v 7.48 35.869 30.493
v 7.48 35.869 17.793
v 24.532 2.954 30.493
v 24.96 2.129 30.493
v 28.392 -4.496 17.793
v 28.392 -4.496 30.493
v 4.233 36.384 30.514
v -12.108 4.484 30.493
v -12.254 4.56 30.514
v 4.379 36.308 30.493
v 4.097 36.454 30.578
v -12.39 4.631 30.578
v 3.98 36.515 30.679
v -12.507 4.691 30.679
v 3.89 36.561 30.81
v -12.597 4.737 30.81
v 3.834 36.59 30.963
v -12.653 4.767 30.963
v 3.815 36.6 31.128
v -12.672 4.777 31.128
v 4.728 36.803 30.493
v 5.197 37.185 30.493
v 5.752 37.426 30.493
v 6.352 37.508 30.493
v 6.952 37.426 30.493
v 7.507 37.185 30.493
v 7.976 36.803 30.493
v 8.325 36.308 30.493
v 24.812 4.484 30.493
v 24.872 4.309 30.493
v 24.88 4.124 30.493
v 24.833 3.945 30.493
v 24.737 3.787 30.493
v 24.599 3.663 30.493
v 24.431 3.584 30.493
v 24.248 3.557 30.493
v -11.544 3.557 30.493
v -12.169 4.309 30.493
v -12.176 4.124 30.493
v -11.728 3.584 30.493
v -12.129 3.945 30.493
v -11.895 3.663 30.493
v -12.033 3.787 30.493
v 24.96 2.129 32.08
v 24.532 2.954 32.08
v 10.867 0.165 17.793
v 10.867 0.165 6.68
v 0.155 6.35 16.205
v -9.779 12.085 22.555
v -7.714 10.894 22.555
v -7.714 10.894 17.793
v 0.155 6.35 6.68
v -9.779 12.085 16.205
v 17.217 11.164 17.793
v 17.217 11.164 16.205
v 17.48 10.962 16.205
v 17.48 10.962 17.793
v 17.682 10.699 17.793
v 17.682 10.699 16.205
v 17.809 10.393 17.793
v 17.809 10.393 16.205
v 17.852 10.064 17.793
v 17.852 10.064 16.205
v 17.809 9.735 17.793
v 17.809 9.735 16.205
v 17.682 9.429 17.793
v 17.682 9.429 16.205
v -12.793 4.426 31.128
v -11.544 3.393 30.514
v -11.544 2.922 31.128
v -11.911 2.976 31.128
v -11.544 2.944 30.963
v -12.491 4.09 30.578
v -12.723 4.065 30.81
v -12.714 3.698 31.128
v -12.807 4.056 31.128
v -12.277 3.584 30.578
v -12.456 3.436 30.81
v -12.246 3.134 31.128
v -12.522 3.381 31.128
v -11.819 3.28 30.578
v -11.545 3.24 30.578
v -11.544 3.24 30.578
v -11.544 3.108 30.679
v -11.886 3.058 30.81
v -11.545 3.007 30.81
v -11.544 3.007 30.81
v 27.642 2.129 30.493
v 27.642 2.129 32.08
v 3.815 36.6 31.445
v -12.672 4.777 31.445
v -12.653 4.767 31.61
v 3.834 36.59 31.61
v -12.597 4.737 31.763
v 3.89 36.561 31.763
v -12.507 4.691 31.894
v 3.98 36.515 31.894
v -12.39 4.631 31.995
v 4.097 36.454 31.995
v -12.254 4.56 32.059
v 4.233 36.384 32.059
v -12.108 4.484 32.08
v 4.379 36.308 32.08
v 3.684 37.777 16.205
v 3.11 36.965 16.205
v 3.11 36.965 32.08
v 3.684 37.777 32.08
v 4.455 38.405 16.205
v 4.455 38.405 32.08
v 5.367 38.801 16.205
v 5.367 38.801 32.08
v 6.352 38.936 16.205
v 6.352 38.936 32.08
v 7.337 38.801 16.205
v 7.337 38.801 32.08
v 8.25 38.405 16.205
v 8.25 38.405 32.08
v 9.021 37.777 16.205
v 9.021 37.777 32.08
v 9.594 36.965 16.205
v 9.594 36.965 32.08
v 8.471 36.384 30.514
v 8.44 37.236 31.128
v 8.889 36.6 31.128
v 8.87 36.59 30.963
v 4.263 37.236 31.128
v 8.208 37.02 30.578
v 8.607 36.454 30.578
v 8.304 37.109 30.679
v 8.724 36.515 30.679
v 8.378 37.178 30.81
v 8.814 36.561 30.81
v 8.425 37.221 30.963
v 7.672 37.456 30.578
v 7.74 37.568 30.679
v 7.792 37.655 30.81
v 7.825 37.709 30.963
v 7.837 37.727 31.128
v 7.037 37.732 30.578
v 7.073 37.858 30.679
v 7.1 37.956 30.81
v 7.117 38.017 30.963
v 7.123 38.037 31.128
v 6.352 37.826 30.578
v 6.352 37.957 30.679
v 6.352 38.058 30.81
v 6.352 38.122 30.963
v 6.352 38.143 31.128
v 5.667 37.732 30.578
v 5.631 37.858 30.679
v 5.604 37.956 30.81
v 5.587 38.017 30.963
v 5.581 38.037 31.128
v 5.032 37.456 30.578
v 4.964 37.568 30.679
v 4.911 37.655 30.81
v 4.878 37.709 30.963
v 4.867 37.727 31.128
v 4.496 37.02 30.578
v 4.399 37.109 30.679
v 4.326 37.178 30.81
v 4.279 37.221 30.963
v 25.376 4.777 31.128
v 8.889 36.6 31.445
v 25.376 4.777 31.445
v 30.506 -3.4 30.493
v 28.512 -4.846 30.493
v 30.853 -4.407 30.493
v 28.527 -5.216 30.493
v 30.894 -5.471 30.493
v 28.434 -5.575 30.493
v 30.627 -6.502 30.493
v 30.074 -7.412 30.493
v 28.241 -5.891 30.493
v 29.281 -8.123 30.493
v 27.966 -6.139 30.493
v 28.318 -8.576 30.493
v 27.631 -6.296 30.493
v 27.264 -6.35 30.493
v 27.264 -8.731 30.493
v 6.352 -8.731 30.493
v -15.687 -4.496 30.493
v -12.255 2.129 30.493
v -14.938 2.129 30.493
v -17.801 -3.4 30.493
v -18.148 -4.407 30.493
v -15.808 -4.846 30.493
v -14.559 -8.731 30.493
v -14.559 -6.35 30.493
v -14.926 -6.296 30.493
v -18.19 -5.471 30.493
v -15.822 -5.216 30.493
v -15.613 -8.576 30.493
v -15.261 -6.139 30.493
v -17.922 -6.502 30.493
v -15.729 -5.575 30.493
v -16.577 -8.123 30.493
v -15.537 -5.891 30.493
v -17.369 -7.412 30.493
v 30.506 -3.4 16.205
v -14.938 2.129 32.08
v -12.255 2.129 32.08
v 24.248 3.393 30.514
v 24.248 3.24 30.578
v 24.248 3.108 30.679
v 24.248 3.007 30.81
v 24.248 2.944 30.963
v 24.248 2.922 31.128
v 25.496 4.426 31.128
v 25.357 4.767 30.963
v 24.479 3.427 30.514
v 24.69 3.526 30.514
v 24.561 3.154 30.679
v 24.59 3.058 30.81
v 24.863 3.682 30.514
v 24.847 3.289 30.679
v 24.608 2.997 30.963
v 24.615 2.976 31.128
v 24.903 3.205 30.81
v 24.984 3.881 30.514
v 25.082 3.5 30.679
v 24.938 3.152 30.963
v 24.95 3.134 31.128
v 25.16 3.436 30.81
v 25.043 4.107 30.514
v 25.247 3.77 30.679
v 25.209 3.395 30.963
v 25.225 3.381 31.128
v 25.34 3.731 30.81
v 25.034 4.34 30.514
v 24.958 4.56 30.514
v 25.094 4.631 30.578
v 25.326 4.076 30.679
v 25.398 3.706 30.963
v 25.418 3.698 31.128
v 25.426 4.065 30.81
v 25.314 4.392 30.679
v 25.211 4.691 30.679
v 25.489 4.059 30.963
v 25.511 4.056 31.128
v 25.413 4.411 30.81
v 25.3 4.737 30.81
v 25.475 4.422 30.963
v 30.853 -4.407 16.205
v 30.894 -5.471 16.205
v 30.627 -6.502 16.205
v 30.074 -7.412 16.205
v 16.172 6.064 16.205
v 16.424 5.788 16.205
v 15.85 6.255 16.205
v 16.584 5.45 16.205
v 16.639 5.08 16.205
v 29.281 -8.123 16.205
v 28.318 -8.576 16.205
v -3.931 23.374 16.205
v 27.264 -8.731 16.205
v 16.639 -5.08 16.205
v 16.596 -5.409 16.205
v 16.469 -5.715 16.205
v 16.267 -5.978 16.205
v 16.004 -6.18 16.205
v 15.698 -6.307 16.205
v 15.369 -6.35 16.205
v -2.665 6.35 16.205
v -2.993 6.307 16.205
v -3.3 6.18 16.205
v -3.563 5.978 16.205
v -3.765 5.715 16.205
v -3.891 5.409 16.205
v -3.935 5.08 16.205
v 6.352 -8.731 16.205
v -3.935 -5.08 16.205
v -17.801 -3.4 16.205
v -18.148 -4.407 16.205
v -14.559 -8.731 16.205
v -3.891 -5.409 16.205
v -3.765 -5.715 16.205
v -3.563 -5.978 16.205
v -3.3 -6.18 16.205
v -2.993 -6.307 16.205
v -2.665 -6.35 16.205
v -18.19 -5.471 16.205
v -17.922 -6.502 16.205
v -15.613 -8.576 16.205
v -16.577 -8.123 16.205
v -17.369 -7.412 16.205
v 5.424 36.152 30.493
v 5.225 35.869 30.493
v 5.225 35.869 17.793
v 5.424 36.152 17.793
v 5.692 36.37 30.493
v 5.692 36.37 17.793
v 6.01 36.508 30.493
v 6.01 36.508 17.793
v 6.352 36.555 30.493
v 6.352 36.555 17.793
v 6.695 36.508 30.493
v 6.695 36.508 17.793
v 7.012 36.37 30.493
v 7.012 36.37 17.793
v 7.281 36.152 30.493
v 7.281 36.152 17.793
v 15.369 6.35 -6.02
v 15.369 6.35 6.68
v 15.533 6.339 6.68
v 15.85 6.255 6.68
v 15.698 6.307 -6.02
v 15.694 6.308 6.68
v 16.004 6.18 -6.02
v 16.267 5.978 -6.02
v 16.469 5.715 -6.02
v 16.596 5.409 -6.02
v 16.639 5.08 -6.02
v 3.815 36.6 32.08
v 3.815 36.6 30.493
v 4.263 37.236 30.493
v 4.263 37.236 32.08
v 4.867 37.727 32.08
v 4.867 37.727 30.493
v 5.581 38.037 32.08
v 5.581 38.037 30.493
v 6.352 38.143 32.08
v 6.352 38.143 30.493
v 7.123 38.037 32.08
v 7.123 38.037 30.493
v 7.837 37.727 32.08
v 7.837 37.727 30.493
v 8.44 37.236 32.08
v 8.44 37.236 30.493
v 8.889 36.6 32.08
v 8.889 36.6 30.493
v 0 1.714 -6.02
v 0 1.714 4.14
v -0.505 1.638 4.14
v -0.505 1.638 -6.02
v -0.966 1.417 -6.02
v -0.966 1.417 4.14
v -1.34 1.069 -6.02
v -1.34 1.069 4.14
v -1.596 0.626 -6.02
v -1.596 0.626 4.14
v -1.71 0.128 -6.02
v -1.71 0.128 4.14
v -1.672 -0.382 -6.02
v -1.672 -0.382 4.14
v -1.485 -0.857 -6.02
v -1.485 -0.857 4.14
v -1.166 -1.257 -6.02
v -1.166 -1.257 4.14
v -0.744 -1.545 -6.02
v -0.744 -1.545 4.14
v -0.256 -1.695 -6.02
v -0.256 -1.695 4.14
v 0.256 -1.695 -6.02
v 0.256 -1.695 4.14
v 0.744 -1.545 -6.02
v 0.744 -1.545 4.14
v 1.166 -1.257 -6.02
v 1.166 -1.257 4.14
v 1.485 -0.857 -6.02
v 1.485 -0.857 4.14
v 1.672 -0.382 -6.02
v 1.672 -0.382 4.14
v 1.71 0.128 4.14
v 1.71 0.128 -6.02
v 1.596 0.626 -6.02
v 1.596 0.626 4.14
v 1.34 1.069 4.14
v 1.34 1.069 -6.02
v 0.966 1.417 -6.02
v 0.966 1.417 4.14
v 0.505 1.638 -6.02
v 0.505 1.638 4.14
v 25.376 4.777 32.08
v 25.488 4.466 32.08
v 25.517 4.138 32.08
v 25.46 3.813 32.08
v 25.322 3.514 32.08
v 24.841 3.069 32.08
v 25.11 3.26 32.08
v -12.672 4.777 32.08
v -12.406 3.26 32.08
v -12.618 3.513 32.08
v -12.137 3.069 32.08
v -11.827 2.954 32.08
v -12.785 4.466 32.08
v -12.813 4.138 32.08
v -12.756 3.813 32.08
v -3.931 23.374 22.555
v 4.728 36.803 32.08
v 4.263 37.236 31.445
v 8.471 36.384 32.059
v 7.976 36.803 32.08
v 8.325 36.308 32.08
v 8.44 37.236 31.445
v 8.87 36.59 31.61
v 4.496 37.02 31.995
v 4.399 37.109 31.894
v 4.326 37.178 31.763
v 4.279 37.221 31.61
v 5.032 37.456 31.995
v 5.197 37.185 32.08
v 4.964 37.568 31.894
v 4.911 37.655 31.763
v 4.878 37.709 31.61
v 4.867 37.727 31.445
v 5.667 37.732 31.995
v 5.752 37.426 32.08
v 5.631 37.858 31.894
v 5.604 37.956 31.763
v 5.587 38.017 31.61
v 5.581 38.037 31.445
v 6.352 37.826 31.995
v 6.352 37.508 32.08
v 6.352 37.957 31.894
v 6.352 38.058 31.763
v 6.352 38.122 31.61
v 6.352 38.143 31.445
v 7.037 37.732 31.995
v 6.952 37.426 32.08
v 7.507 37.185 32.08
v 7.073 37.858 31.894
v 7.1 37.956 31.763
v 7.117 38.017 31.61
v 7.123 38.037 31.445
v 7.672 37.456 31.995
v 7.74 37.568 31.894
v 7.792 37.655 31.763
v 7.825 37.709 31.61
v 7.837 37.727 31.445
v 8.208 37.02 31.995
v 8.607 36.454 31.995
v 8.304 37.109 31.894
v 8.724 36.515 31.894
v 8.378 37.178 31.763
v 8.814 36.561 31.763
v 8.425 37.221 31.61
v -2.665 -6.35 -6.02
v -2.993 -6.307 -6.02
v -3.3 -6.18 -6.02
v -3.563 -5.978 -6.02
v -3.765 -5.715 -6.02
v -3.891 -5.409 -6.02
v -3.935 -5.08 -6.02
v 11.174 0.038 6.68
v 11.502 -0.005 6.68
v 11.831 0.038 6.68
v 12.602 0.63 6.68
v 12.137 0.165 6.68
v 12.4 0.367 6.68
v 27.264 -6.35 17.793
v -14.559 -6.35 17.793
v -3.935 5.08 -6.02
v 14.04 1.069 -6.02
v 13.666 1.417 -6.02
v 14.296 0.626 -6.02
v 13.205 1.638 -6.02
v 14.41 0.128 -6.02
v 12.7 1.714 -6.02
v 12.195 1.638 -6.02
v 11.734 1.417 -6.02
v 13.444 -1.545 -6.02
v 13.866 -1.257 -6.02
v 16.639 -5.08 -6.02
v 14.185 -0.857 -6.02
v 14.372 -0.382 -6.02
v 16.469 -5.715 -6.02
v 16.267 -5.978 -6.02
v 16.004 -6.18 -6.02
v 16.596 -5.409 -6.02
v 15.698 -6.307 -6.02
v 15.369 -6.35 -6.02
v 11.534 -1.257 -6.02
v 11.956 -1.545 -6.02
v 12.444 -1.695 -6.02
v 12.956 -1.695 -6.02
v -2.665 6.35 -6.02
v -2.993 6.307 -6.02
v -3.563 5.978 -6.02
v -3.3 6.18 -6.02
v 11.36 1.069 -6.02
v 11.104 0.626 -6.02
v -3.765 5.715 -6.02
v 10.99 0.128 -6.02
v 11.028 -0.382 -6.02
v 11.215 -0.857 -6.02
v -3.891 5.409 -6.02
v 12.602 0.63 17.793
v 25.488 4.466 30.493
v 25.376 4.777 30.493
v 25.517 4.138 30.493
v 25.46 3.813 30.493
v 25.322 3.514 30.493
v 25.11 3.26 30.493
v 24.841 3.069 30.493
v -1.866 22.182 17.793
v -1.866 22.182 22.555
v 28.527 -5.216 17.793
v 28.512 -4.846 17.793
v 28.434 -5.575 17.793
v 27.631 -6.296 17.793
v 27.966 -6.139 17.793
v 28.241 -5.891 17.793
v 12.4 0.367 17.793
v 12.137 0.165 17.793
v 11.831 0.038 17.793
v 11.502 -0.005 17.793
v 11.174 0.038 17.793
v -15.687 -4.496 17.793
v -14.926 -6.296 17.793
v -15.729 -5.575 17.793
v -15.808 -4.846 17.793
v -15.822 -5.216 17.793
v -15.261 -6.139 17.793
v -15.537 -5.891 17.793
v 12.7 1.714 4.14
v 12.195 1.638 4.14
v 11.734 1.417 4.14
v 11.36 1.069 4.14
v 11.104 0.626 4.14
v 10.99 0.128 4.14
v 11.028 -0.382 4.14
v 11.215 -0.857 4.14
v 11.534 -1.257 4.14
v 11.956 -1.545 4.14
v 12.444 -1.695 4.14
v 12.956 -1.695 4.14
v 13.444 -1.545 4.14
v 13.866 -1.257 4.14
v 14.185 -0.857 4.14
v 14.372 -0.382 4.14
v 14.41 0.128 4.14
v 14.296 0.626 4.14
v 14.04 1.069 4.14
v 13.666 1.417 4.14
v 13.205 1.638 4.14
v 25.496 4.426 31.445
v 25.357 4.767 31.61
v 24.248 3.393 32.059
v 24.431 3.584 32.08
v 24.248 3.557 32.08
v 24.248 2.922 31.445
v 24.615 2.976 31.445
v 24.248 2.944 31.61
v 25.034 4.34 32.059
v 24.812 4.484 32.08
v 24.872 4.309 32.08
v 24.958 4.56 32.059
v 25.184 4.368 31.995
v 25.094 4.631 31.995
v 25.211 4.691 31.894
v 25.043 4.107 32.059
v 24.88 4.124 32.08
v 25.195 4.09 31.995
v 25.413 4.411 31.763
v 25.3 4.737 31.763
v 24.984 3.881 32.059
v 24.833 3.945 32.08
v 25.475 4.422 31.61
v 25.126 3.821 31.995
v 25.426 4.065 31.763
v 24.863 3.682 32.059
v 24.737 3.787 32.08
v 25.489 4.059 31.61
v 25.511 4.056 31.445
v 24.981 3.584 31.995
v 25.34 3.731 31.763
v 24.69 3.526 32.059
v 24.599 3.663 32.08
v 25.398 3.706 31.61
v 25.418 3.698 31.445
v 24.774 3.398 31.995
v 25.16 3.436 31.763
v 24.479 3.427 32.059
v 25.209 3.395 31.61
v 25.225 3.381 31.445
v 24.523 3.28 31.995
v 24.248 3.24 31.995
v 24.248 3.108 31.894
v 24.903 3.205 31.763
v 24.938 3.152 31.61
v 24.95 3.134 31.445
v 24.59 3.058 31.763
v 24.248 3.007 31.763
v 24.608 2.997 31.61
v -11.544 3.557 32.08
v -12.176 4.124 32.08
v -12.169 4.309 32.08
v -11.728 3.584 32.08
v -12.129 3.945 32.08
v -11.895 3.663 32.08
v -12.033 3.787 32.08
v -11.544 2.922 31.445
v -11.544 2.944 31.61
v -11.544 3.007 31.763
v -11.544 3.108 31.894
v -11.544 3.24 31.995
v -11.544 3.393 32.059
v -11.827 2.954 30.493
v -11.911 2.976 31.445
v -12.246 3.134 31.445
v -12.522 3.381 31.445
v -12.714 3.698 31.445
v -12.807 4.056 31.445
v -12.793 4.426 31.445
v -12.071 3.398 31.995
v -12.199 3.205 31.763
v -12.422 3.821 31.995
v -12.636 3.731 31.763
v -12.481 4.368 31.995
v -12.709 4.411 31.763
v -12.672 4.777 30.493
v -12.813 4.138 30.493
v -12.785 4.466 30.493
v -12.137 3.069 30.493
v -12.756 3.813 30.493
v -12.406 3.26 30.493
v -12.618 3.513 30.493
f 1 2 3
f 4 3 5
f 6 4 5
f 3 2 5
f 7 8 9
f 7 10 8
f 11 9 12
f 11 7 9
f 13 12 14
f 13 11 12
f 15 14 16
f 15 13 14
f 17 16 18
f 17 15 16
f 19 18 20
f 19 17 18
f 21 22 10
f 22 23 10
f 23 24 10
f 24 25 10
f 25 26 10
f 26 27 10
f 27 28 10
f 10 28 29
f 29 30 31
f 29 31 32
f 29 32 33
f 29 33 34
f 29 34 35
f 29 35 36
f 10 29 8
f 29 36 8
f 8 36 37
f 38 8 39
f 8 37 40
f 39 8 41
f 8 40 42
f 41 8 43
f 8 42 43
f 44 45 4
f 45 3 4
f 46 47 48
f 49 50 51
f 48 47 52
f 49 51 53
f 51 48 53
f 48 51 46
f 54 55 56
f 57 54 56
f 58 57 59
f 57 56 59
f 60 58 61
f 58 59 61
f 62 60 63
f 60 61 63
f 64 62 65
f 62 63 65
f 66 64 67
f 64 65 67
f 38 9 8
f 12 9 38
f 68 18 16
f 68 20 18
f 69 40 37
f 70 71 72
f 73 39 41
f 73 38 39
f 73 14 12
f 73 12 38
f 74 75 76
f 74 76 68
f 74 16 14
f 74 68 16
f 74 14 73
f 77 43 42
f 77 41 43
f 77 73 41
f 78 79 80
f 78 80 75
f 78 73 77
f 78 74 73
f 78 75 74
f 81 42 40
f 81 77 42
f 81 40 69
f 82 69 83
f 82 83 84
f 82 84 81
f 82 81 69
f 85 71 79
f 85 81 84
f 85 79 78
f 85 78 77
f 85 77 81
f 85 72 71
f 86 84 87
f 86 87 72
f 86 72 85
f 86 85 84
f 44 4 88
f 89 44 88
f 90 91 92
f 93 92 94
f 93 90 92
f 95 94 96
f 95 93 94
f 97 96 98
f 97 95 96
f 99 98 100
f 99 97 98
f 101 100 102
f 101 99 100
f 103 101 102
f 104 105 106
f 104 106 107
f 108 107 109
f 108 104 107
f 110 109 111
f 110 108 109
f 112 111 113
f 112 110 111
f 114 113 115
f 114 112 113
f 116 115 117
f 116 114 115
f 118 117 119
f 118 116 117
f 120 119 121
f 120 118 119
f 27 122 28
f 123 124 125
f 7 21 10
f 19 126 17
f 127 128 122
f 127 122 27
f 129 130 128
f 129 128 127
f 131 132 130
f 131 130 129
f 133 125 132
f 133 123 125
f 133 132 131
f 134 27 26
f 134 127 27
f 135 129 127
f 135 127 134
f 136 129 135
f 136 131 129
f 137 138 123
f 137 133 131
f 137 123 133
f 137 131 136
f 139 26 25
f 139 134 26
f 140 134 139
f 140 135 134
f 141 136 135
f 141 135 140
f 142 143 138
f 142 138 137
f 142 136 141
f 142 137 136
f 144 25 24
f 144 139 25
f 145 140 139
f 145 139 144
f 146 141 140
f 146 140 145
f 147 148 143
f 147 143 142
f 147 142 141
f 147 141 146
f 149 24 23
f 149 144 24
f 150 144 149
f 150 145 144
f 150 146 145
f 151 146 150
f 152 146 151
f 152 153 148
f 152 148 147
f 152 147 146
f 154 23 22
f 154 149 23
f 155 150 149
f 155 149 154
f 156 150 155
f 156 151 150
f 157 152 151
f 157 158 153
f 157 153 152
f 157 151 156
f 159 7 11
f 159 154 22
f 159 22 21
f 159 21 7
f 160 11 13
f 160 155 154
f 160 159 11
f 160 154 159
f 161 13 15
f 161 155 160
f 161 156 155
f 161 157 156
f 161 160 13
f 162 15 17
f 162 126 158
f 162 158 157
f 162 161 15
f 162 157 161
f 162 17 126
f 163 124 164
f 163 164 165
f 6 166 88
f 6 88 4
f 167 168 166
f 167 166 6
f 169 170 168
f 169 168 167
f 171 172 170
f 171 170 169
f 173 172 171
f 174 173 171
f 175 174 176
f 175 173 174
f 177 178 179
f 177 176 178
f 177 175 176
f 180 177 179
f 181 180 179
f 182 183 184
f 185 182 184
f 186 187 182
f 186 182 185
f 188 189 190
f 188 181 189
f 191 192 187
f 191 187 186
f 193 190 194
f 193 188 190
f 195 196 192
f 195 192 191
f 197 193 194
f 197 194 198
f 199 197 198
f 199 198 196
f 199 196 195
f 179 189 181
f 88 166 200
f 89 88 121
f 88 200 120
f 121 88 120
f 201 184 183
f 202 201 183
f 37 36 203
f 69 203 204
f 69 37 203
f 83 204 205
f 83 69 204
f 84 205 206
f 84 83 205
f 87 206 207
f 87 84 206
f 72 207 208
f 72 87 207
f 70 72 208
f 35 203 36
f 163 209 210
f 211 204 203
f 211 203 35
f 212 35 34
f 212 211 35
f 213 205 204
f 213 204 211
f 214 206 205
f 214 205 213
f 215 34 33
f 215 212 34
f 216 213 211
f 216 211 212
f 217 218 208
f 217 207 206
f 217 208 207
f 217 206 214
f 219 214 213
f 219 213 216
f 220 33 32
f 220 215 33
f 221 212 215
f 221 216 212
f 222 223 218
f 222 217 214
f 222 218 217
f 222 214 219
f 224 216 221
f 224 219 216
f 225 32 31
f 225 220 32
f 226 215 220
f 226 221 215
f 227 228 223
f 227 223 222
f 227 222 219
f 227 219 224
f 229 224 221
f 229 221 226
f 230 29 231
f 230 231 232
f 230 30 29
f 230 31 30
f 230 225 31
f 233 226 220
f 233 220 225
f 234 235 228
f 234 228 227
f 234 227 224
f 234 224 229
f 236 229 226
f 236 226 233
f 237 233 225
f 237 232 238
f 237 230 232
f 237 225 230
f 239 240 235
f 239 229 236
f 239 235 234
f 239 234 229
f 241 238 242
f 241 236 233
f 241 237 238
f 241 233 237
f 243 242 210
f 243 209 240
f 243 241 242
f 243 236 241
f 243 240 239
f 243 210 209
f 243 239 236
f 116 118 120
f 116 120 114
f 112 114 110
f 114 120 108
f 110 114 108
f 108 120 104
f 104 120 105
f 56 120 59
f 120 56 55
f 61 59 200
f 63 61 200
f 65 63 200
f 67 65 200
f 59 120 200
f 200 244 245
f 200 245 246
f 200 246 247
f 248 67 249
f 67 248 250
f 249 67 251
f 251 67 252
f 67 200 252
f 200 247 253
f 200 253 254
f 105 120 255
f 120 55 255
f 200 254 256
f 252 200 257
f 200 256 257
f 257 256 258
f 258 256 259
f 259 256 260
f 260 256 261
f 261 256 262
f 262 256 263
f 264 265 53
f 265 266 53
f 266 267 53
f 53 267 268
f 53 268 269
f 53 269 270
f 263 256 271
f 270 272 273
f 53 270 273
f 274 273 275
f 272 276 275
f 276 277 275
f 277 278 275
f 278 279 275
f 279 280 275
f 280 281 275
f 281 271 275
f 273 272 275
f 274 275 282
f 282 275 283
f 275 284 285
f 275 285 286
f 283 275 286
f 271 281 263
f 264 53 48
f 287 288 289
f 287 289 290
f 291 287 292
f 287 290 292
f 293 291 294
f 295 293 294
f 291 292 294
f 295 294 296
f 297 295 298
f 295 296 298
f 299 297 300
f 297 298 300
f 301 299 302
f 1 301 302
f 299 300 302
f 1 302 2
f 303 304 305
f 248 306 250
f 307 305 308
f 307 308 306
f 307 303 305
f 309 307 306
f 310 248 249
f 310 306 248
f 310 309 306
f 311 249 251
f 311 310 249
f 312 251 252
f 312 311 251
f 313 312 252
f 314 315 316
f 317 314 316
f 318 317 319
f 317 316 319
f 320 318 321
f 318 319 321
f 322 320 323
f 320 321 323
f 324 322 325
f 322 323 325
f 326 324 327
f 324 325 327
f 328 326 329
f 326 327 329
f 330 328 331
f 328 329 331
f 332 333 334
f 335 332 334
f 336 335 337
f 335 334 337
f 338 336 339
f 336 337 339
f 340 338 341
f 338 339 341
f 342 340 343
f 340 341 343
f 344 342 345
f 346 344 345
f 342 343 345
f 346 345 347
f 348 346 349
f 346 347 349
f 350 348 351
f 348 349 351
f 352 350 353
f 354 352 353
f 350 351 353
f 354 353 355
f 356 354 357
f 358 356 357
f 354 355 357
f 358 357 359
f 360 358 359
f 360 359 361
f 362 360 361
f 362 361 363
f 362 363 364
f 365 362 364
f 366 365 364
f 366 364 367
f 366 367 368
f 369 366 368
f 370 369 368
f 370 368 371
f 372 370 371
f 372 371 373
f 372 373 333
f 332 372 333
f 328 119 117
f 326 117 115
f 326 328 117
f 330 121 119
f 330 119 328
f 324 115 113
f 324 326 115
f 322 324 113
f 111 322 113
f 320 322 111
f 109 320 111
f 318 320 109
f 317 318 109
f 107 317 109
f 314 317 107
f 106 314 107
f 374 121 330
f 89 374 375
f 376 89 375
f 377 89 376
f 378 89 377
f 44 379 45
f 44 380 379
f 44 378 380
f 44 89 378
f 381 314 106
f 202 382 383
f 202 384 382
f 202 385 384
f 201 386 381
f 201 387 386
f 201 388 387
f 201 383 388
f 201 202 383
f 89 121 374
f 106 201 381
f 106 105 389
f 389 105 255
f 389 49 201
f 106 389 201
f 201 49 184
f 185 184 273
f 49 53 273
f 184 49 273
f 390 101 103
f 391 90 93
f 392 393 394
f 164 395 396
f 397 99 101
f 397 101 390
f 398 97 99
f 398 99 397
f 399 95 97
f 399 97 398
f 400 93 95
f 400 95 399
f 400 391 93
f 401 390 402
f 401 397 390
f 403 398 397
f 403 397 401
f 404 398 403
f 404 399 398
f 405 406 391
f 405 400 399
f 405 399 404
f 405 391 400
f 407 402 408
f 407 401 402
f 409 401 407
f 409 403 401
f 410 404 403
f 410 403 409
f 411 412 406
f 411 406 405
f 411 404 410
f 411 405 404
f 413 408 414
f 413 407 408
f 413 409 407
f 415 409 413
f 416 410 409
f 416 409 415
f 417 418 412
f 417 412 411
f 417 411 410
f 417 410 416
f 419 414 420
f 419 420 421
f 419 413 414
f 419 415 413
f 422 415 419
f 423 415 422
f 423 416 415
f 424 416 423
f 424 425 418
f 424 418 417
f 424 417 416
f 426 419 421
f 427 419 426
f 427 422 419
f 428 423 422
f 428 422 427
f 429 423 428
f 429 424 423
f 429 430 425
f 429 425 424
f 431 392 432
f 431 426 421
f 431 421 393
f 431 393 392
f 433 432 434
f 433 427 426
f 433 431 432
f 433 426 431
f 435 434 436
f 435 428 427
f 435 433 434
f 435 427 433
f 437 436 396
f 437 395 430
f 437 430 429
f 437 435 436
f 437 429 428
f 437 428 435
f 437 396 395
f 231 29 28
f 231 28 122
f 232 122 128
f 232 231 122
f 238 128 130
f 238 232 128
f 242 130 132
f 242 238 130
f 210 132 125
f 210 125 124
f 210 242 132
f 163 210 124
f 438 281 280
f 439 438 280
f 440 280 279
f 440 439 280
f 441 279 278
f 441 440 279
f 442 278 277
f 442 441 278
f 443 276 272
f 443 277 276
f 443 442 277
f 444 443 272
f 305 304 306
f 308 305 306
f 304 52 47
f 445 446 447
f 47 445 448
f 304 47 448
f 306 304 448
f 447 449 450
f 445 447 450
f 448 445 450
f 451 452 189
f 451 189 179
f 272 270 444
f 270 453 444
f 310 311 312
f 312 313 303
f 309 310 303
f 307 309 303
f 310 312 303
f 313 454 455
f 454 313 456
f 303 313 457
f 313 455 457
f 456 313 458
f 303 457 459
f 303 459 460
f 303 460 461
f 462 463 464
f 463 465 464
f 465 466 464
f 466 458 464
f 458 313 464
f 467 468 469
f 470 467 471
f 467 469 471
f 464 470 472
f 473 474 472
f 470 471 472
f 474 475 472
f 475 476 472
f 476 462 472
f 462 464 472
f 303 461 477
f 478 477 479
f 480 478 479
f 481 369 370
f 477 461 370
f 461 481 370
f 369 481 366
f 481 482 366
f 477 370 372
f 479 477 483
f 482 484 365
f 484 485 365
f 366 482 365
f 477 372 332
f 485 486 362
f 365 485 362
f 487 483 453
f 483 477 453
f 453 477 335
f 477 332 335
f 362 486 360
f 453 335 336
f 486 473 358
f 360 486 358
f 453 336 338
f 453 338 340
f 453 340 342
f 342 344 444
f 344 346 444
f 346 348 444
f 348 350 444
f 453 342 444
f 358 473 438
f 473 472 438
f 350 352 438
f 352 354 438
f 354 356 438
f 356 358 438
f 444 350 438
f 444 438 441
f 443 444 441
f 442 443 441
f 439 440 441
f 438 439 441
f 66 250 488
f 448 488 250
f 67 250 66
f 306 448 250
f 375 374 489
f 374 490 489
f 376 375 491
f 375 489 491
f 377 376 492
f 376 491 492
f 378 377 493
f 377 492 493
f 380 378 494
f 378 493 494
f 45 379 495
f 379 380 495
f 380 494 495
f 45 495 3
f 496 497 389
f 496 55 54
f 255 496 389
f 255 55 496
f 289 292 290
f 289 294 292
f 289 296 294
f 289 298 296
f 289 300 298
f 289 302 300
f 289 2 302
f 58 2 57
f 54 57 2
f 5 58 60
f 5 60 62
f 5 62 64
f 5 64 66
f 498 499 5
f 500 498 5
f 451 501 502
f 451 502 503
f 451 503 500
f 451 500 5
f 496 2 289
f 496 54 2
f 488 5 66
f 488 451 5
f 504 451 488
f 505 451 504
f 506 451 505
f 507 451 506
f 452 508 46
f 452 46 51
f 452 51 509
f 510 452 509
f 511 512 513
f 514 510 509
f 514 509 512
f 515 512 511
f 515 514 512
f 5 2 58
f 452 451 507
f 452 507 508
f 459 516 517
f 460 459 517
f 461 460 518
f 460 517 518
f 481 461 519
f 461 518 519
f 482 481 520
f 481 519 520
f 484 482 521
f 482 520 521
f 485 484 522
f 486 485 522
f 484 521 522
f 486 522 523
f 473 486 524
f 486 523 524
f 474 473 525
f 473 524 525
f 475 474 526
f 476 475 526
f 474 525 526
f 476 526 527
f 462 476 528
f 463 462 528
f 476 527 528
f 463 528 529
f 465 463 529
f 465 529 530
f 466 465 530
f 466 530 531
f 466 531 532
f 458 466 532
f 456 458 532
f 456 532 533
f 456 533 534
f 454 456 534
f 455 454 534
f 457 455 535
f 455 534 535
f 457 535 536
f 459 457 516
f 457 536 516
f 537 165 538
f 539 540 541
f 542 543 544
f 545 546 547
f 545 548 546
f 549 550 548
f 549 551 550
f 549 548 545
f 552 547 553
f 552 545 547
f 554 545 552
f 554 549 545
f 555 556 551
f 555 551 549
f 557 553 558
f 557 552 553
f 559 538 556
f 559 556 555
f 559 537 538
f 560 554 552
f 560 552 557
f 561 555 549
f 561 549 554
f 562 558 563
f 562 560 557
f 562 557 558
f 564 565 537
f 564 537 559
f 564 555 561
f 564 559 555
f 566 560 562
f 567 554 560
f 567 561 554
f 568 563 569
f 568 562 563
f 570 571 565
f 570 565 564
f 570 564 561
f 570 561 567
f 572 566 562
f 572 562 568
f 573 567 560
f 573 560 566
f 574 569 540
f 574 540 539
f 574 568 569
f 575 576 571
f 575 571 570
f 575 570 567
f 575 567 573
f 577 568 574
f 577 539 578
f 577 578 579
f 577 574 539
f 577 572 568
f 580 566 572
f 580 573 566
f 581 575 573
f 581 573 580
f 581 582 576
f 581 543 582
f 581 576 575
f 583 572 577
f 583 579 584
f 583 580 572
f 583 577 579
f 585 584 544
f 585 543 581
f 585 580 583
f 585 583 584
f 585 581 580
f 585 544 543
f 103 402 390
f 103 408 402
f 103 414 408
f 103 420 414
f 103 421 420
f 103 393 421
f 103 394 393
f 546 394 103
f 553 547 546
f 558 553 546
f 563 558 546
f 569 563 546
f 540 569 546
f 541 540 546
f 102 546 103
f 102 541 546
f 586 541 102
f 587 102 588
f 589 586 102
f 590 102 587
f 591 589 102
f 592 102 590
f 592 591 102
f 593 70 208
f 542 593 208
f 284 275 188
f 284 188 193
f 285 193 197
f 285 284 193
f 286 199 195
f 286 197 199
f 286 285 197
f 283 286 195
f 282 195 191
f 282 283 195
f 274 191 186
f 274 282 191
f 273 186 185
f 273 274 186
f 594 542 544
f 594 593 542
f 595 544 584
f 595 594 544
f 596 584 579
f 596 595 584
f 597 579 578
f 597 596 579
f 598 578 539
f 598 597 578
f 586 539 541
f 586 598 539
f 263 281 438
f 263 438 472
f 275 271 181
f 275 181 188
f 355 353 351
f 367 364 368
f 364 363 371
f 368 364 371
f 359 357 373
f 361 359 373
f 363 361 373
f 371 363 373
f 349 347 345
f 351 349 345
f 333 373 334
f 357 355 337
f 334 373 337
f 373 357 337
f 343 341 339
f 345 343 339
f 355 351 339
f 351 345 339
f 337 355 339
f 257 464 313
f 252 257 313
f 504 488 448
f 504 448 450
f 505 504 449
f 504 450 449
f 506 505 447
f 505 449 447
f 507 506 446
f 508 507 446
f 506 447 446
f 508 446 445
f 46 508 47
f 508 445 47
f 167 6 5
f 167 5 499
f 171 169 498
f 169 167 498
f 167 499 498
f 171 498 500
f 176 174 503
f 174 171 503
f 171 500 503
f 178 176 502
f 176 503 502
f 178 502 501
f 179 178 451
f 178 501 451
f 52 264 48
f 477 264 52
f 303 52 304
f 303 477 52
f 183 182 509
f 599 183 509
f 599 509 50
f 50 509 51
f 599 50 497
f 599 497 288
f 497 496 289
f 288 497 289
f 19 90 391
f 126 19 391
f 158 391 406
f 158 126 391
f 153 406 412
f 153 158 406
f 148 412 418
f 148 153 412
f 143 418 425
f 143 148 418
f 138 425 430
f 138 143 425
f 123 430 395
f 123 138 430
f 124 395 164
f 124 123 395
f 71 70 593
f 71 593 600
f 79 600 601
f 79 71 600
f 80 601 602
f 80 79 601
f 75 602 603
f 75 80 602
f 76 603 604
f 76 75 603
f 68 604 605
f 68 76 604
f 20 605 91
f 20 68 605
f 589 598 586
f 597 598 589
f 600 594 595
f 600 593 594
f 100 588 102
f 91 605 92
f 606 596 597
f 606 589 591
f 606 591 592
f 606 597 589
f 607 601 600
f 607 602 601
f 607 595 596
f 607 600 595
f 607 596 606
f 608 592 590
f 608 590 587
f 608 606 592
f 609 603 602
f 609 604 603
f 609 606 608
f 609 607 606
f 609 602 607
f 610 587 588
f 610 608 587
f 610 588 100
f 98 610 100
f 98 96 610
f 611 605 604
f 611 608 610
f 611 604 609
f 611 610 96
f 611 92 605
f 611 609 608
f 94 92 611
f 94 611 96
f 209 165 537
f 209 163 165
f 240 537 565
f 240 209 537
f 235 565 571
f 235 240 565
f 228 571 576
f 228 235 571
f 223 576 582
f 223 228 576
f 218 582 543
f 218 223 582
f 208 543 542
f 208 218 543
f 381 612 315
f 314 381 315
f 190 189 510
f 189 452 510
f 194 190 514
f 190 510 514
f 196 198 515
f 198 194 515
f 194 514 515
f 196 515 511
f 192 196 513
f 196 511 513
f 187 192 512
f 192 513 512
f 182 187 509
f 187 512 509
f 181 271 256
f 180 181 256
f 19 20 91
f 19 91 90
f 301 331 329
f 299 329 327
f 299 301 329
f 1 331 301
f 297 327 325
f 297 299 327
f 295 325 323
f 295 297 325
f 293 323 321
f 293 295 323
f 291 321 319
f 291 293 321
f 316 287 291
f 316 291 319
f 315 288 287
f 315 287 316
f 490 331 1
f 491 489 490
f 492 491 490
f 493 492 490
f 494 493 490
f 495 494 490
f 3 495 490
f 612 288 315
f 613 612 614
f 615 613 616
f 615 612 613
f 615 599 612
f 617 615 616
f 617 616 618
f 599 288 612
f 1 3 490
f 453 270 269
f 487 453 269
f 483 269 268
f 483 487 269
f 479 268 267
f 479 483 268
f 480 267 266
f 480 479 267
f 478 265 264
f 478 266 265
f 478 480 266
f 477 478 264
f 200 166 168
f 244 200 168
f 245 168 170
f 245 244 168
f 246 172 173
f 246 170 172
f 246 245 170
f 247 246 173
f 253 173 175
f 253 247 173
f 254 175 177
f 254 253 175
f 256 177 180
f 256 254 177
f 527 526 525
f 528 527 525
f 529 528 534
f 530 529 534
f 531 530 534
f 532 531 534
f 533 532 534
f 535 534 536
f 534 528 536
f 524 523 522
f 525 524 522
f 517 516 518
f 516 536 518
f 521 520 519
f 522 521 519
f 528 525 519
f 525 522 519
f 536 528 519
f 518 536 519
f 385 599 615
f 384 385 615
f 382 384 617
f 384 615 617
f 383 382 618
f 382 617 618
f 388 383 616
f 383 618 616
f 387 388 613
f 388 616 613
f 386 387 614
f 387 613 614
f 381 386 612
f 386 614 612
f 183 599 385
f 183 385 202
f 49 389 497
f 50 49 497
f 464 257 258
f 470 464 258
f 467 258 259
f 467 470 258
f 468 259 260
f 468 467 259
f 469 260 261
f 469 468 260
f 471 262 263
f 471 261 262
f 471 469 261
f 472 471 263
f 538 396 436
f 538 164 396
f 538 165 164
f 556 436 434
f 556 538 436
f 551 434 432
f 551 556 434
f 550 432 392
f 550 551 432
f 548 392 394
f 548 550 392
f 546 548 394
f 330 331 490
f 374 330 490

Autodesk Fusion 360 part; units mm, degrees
sketch "Sketch5" plane through (0, 0, -6.0198) normal (0, 0, 1) x (-1, 0, 0)
  line L0 (-4.0409, -57.15) -> (2.9359, -57.15)
  line L1 (2.9359, -57.15) -> (3.9347, -56.1512)
  line L2 (3.9347, -56.1512) -> (3.9347, 6.35)
  line L3 (3.9347, 6.35) -> (-16.6393, 6.35)
  line L4 (-16.6393, 6.35) -> (-16.6393, -56.1512)
  line L5 (-16.6393, -56.1512) -> (-15.6405, -57.15)
  line L6 (-15.6405, -57.15) -> (-8.6637, -57.15)
  line L7 (-8.6637, -57.15) -> (-8.6637, -55.3466)
  arc A0 (-8.1557, -54.8386) -> (-8.6637, -55.3466) centre (-8.1557, -55.3466) ccw
  line L8 (-8.1557, -54.8386) -> (-4.5489, -54.8386)
  arc A1 (-4.0409, -55.3466) -> (-4.5489, -54.8386) centre (-4.5489, -55.3466) ccw
  line L9 (-4.0409, -55.3466) -> (-4.0409, -57.15)
  arc A2 (-8.1557, -42.1386) -> (-8.6637, -42.6466) centre (-8.1557, -42.6466) ccw
  line L10 (-8.1557, -42.1386) -> (-4.5489, -42.1386)
  arc A3 (-4.0409, -42.6466) -> (-4.5489, -42.1386) centre (-4.5489, -42.6466) ccw
  line L11 (-4.0409, -42.6466) -> (-4.0409, -46.2534)
  arc A4 (-4.5489, -46.7614) -> (-4.0409, -46.2534) centre (-4.5489, -46.2534) ccw
  line L12 (-4.5489, -46.7614) -> (-8.1557, -46.7614)
  arc A5 (-8.6637, -46.2534) -> (-8.1557, -46.7614) centre (-8.1557, -46.2534) ccw
  line L13 (-8.6637, -46.2534) -> (-8.6637, -42.6466)
  arc A6 (-8.1557, -29.4386) -> (-8.6637, -29.9466) centre (-8.1557, -29.9466) ccw
  line L14 (-8.1557, -29.4386) -> (-4.5489, -29.4386)
  arc A7 (-4.0409, -29.9466) -> (-4.5489, -29.4386) centre (-4.5489, -29.9466) ccw
  line L15 (-4.0409, -29.9466) -> (-4.0409, -33.5534)
  arc A8 (-4.5489, -34.0614) -> (-4.0409, -33.5534) centre (-4.5489, -33.5534) ccw
  line L16 (-4.5489, -34.0614) -> (-8.1557, -34.0614)
  arc A9 (-8.6637, -33.5534) -> (-8.1557, -34.0614) centre (-8.1557, -33.5534) ccw
  line L17 (-8.6637, -33.5534) -> (-8.6637, -29.9466)
  arc A10 (1.8011, -53.1114) -> (2.3091, -52.6034) centre (1.8011, -52.6034) ccw
  line L18 (1.8011, -53.1114) -> (-1.8057, -53.1114)
  arc A11 (-2.3137, -52.6034) -> (-1.8057, -53.1114) centre (-1.8057, -52.6034) ccw
  line L19 (-2.3137, -52.6034) -> (-2.3137, -48.9966)
  arc A12 (-1.8057, -48.4886) -> (-2.3137, -48.9966) centre (-1.8057, -48.9966) ccw
  line L20 (-1.8057, -48.4886) -> (1.8011, -48.4886)
  arc A13 (2.3091, -48.9966) -> (1.8011, -48.4886) centre (1.8011, -48.9966) ccw
  line L21 (2.3091, -48.9966) -> (2.3091, -52.6034)
  arc A14 (1.8011, -40.4114) -> (2.3091, -39.9034) centre (1.8011, -39.9034) ccw
  line L22 (1.8011, -40.4114) -> (-1.8057, -40.4114)
  arc A15 (-2.3137, -39.9034) -> (-1.8057, -40.4114) centre (-1.8057, -39.9034) ccw
  line L23 (-2.3137, -39.9034) -> (-2.3137, -36.2966)
  arc A16 (-1.8057, -35.7886) -> (-2.3137, -36.2966) centre (-1.8057, -36.2966) ccw
  line L24 (-1.8057, -35.7886) -> (1.8011, -35.7886)
  arc A17 (2.3091, -36.2966) -> (1.8011, -35.7886) centre (1.8011, -36.2966) ccw
  line L25 (2.3091, -36.2966) -> (2.3091, -39.9034)
  arc A18 (1.8011, -27.7114) -> (2.3091, -27.2034) centre (1.8011, -27.2034) ccw
  line L26 (1.8011, -27.7114) -> (-1.8057, -27.7114)
  arc A19 (-2.3137, -27.2034) -> (-1.8057, -27.7114) centre (-1.8057, -27.2034) ccw
  line L27 (-2.3137, -27.2034) -> (-2.3137, -23.5966)
  arc A20 (-1.8057, -23.0886) -> (-2.3137, -23.5966) centre (-1.8057, -23.5966) ccw
  line L28 (-1.8057, -23.0886) -> (1.8011, -23.0886)
  arc A21 (2.3091, -23.5966) -> (1.8011, -23.0886) centre (1.8011, -23.5966) ccw
  line L29 (2.3091, -23.5966) -> (2.3091, -27.2034)
  arc A22 (1.8011, -15.0114) -> (2.3091, -14.5034) centre (1.8011, -14.5034) ccw
  line L30 (1.8011, -15.0114) -> (-1.8057, -15.0114)
  arc A23 (-2.3137, -14.5034) -> (-1.8057, -15.0114) centre (-1.8057, -14.5034) ccw
  line L31 (-2.3137, -14.5034) -> (-2.3137, -10.8966)
  arc A24 (-1.8057, -10.3886) -> (-2.3137, -10.8966) centre (-1.8057, -10.8966) ccw
  line L32 (-1.8057, -10.3886) -> (1.8011, -10.3886)
  arc A25 (2.3091, -10.8966) -> (1.8011, -10.3886) centre (1.8011, -10.8966) ccw
  line L33 (2.3091, -10.8966) -> (2.3091, -14.5034)
  arc A26 (1.8011, -2.3114) -> (2.3091, -1.8034) centre (1.8011, -1.8034) ccw
  line L34 (1.8011, -2.3114) -> (-1.8057, -2.3114)
  arc A27 (-2.3137, -1.8034) -> (-1.8057, -2.3114) centre (-1.8057, -1.8034) ccw
  line L35 (-2.3137, -1.8034) -> (-2.3137, 1.8034)
  arc A28 (-1.8057, 2.3114) -> (-2.3137, 1.8034) centre (-1.8057, 1.8034) ccw
  line L36 (-1.8057, 2.3114) -> (1.8011, 2.3114)
  arc A29 (2.3091, 1.8034) -> (1.8011, 2.3114) centre (1.8011, 1.8034) ccw
  line L37 (2.3091, 1.8034) -> (2.3091, -1.8034)
  arc A30 (-10.8989, -53.1114) -> (-10.3909, -52.6034) centre (-10.8989, -52.6034) ccw
  line L38 (-10.8989, -53.1114) -> (-14.5057, -53.1114)
  arc A31 (-15.0137, -52.6034) -> (-14.5057, -53.1114) centre (-14.5057, -52.6034) ccw
  line L39 (-15.0137, -52.6034) -> (-15.0137, -48.9966)
  arc A32 (-14.5057, -48.4886) -> (-15.0137, -48.9966) centre (-14.5057, -48.9966) ccw
  line L40 (-14.5057, -48.4886) -> (-10.8989, -48.4886)
  arc A33 (-10.3909, -48.9966) -> (-10.8989, -48.4886) centre (-10.8989, -48.9966) ccw
  line L41 (-10.3909, -48.9966) -> (-10.3909, -52.6034)
  arc A34 (-10.8989, -40.4114) -> (-10.3909, -39.9034) centre (-10.8989, -39.9034) ccw
  line L42 (-10.8989, -40.4114) -> (-14.5057, -40.4114)
  arc A35 (-15.0137, -39.9034) -> (-14.5057, -40.4114) centre (-14.5057, -39.9034) ccw
  line L43 (-15.0137, -39.9034) -> (-15.0137, -36.2966)
  arc A36 (-14.5057, -35.7886) -> (-15.0137, -36.2966) centre (-14.5057, -36.2966) ccw
  line L44 (-14.5057, -35.7886) -> (-10.8989, -35.7886)
  arc A37 (-10.3909, -36.2966) -> (-10.8989, -35.7886) centre (-10.8989, -36.2966) ccw
  line L45 (-10.3909, -36.2966) -> (-10.3909, -39.9034)
  arc A38 (-10.8989, -27.7114) -> (-10.3909, -27.2034) centre (-10.8989, -27.2034) ccw
  line L46 (-10.8989, -27.7114) -> (-14.5057, -27.7114)
  arc A39 (-15.0137, -27.2034) -> (-14.5057, -27.7114) centre (-14.5057, -27.2034) ccw
  line L47 (-15.0137, -27.2034) -> (-15.0137, -23.5966)
  arc A40 (-14.5057, -23.0886) -> (-15.0137, -23.5966) centre (-14.5057, -23.5966) ccw
  line L48 (-14.5057, -23.0886) -> (-10.8989, -23.0886)
  arc A41 (-10.3909, -23.5966) -> (-10.8989, -23.0886) centre (-10.8989, -23.5966) ccw
  line L49 (-10.3909, -23.5966) -> (-10.3909, -27.2034)
  arc A42 (-10.8989, -15.0114) -> (-10.3909, -14.5034) centre (-10.8989, -14.5034) ccw
  line L50 (-10.8989, -15.0114) -> (-14.5057, -15.0114)
  arc A43 (-15.0137, -14.5034) -> (-14.5057, -15.0114) centre (-14.5057, -14.5034) ccw
  line L51 (-15.0137, -14.5034) -> (-15.0137, -10.8966)
  arc A44 (-14.5057, -10.3886) -> (-15.0137, -10.8966) centre (-14.5057, -10.8966) ccw
  line L52 (-14.5057, -10.3886) -> (-10.8989, -10.3886)
  arc A45 (-10.3909, -10.8966) -> (-10.8989, -10.3886) centre (-10.8989, -10.8966) ccw
  line L53 (-10.3909, -10.8966) -> (-10.3909, -14.5034)
  arc A46 (-10.8989, -2.3114) -> (-10.3909, -1.8034) centre (-10.8989, -1.8034) ccw
  line L54 (-10.8989, -2.3114) -> (-14.5057, -2.3114)
  arc A47 (-15.0137, -1.8034) -> (-14.5057, -2.3114) centre (-14.5057, -1.8034) ccw
  line L55 (-15.0137, -1.8034) -> (-15.0137, 1.8034)
  arc A48 (-14.5057, 2.3114) -> (-15.0137, 1.8034) centre (-14.5057, 1.8034) ccw
  line L56 (-14.5057, 2.3114) -> (-10.8989, 2.3114)
  arc A49 (-10.3909, 1.8034) -> (-10.8989, 2.3114) centre (-10.8989, 1.8034) ccw
  line L57 (-10.3909, 1.8034) -> (-10.3909, -1.8034)
  arc A50 (-8.6637, -8.1534) -> (-8.1557, -8.6614) centre (-8.1557, -8.1534) ccw
  line L58 (-8.6637, -8.1534) -> (-8.6637, -4.5466)
  arc A51 (-8.1557, -4.0386) -> (-8.6637, -4.5466) centre (-8.1557, -4.5466) ccw
  line L59 (-8.1557, -4.0386) -> (-4.5489, -4.0386)
  arc A52 (-4.0409, -4.5466) -> (-4.5489, -4.0386) centre (-4.5489, -4.5466) ccw
  line L60 (-4.0409, -4.5466) -> (-4.0409, -8.1534)
  arc A53 (-4.5489, -8.6614) -> (-4.0409, -8.1534) centre (-4.5489, -8.1534) ccw
  line L61 (-4.5489, -8.6614) -> (-8.1557, -8.6614)
  arc A54 (-8.1557, -16.7386) -> (-8.6637, -17.2466) centre (-8.1557, -17.2466) ccw
  line L62 (-8.1557, -16.7386) -> (-4.5489, -16.7386)
  arc A55 (-4.0409, -17.2466) -> (-4.5489, -16.7386) centre (-4.5489, -17.2466) ccw
  line L63 (-4.0409, -17.2466) -> (-4.0409, -20.8534)
  arc A56 (-4.5489, -21.3614) -> (-4.0409, -20.8534) centre (-4.5489, -20.8534) ccw
  line L64 (-4.5489, -21.3614) -> (-8.1557, -21.3614)
  arc A57 (-8.6637, -20.8534) -> (-8.1557, -21.3614) centre (-8.1557, -20.8534) ccw
  line L65 (-8.6637, -20.8534) -> (-8.6637, -17.2466)
  line L66 (3.9347, 5.08) -> (3.9347, -5.08)
  line L67 (2.6647, -6.35) -> (-15.3693, -6.35)
  line L68 (-16.6393, -5.08) -> (-16.6393, 5.08)
  line L69 (-15.3693, 6.35) -> (2.6647, 6.35)
  arc A58 (2.6647, -6.35) -> (3.9347, -5.08) centre (2.6647, -5.08) ccw
  arc A59 (3.9347, 5.08) -> (2.6647, 6.35) centre (2.6647, 5.08) ccw
  arc A60 (-16.6393, -5.08) -> (-15.3693, -6.35) centre (-15.3693, -5.08) ccw
  arc A61 (-15.3693, 6.35) -> (-16.6393, 5.08) centre (-15.3693, 5.08) ccw
  point P0 (3.9347, 6.35)
  point P1 (3.9347, -6.35)
  dimension "d56" = 12.7
  dimension "d57" = 1.27
extrude "Extrude8" add sketch "Sketch5" along normal blind 22.225 contours L2 L3 L4 L58 A51 L59 A52 L60 L66 L67 L68 L69 A58 A59 A60 A61 | L58 A51 L59 A52 L60 L67 | A26 L34 A27 L35 A28 L36 A29 L37 | A46 L54 A47 L55 A48 L56 A49 L57 makes body 1
sketch "Sketch9" plane through (0, 0, 16.2052) normal (0, 0, 1) x (-1, 0, 0)
  arc A0 (3.9347, 5.08) -> (2.6647, 6.35) centre (2.6647, 5.08) ccw
  line L0 (2.6647, 6.35) -> (-15.3693, 6.35)
  arc A1 (-15.3693, 6.35) -> (-16.6393, 5.08) centre (-15.3693, 5.08) ccw
  line L1 (-16.6393, 5.08) -> (-16.6393, -5.08)
  arc A2 (-16.6393, -5.08) -> (-15.3693, -6.35) centre (-15.3693, -5.08) ccw
  line L2 (-15.3693, -6.35) -> (2.6647, -6.35)
  arc A3 (2.6647, -6.35) -> (3.9347, -5.08) centre (2.6647, -5.08) ccw
  line L3 (3.9347, -5.08) -> (3.9347, 5.08)
  line L4 (-6.3523, 6.35) -> (-27.2641, 6.35)
  line L5 (-6.3523, 6.35) -> (14.5594, 6.35)
  line L6 (-6.3523, 6.35) -> (-6.3523, -83.9563)
  line L7 (15.6871, 4.4958) -> (-5.2247, -35.8693)
  line L8 (-7.48, -35.8693) -> (-28.3917, 4.4958)
  arc A4 (-7.48, -35.8693) -> (-5.2247, -35.8693) centre (-6.3523, -35.2851) ccw
  arc A5 (-27.2641, 6.35) -> (-28.3917, 4.4958) centre (-27.2641, 5.08) ccw
  arc A6 (15.6871, 4.4958) -> (14.5594, 6.35) centre (14.5594, 5.08) ccw
  line L9 (-6.3523, 8.7312) -> (-27.2641, 8.7312)
  arc A7 (-27.2641, 8.7312) -> (-30.5061, 3.4004) centre (-27.2641, 5.08) ccw
  line L10 (-9.5943, -36.9647) -> (-30.5061, 3.4004)
  arc A8 (-9.5943, -36.9647) -> (-3.1103, -36.9647) centre (-6.3523, -35.2851) ccw
  line L11 (17.8014, 3.4004) -> (-3.1103, -36.9647)
  arc A9 (17.8014, 3.4004) -> (14.5594, 8.7313) centre (14.5594, 5.08) ccw
  line L12 (-6.3523, 8.7312) -> (14.5594, 8.7312)
  point P0 (-29.3523, 6.35)
  point P1 (16.6477, 6.35)
  point P2 (-6.3523, -38.0459)
  dimension "d100" = 23
  dimension "d101" = 23
  dimension "d102" = 50
  dimension "d103" = 1.27
  dimension "d104" = -2.3813
extrude "Extrude15" add sketch "Sketch9" along normal blind 14.2875 separate body makes body 2
extrude "Extrude16" add sketch "Sketch9" along normal blind 1.5875 contours A0 L0 L2 A3 L3 L5 L6 | A0 L2 A3 L3 L5 L6 L7 A4 A6 | L0 A1 L1 A2 L2 L4 L6 | A1 L1 A2 L2 L4 L6 L8 A4 A5 bodies 1 2
sketch "Sketch10" plane through (0, 0, 16.2052) normal (0, 0, -1) x (1, 0, 0)
  arc A0 (16.6393, 5.08) -> (15.3693, 6.35) centre (15.3693, 5.08) ccw
  line L0 (16.6393, 5.08) -> (16.6393, -5.08)
  arc A1 (15.3693, -6.35) -> (16.6393, -5.08) centre (15.3693, -5.08) ccw
  line L1 (15.3693, -6.35) -> (-2.6647, -6.35)
  arc A2 (-3.9347, -5.08) -> (-2.6647, -6.35) centre (-2.6647, -5.08) ccw
  line L2 (-3.9347, -5.08) -> (-3.9347, 5.08)
  arc A3 (-2.6647, 6.35) -> (-3.9347, 5.08) centre (-2.6647, 5.08) ccw
  line L3 (-2.6647, 6.35) -> (15.3693, 6.35)
  arc A4 (30.5061, 3.4004) -> (27.2641, 8.7312) centre (27.2641, 5.08) ccw
  line L4 (27.2641, 8.7312) -> (-14.5594, 8.7312)
  arc A5 (-14.5594, 8.7312) -> (-17.8014, 3.4004) centre (-14.5594, 5.08) ccw
  line L5 (-17.8014, 3.4004) -> (3.1103, -36.9647)
  arc A6 (3.1103, -36.9647) -> (9.5943, -36.9647) centre (6.3523, -35.2851) ccw
  line L6 (9.5943, -36.9647) -> (30.5061, 3.4004)
  line L7 (7.0603, -44.5891) -> (-20.7698, 9.13)
  line L8 (-6.8547, -17.7295) -> (15.1423, -5.0295)
  line L9 (-6.8547, -17.7295) -> (11.4408, -17.7295) construction
  line L10 (15.1423, -5.0295) -> (12.6023, -0.6301)
  line L11 (10.8674, -0.1653) -> (-9.7788, -12.0854)
  line L12 (15.1423, -5.0295) -> (17.6823, -9.4289)
  line L13 (17.2174, -11.1638) -> (-3.9307, -23.3737)
  line L14 (-3.9307, -23.3737) -> (-9.7788, -12.0854)
  arc A7 (17.2174, -11.1638) -> (17.6823, -9.4289) centre (16.5824, -10.0639) ccw
  arc A8 (12.6023, -0.6301) -> (10.8674, -0.1653) centre (11.5024, -1.2651) ccw
  point P0 (11.9673, 0.4697)
  point P1 (18.3173, -10.5288)
  dimension "d109" = 30
  dimension "d110" = 25.4
  dimension "d111" = 6.35
  dimension "d112" = 90
  dimension "d113" = 6.35
  dimension "d114" = 90
  dimension "d115" = 1.27
extrude "Extrude17" cut sketch "Sketch10" against normal blind 1.6002 contours A1 L1 L5 L7 L8 L12 L13 L14 A7 | A1 L1 L8 L12 | L1 L8 L10 L11 A8 | L1 L5 L7 L8 L11 L14 bodies 1
extrude "Extrude18" cut sketch "Sketch10" along normal blind 9.525 contours A1 L1 L5 L7 L8 L12 L13 L14 A7 | A1 L1 L8 L12 | L1 L8 L10 L11 A8 | L1 L5 L7 L8 L11 L14 bodies 1
sketch "Sketch11" plane through (0, 0, 30.4927) normal (0, 0, 1) x (-1, 0, 0)
  arc A0 (-7.48, -35.8693) -> (-5.2247, -35.8693) centre (-6.3523, -35.2851) ccw
  line L0 (-7.48, -35.8693) -> (-28.3917, 4.4958)
  arc A1 (-27.2641, 6.35) -> (-28.3917, 4.4958) centre (-27.2641, 5.08) ccw
  line L1 (-27.2641, 6.35) -> (14.5594, 6.35)
  arc A2 (15.6871, 4.4958) -> (14.5594, 6.35) centre (14.5594, 5.08) ccw
  line L2 (15.6871, 4.4958) -> (-5.2247, -35.8693)
  arc A3 (-27.2641, 8.7312) -> (-30.5061, 3.4004) centre (-27.2641, 5.08) ccw
  line L3 (-30.5061, 3.4004) -> (-9.5943, -36.9647)
  arc A4 (-9.5943, -36.9647) -> (-3.1103, -36.9647) centre (-6.3523, -35.2851) ccw
  line L4 (-3.1103, -36.9647) -> (17.8014, 3.4004)
  arc A5 (17.8014, 3.4004) -> (14.5594, 8.7313) centre (14.5594, 5.08) ccw
  line L5 (14.5594, 8.7313) -> (-27.2641, 8.7312)
  line L6 (20.7799, 9.1479) -> (14.9379, -2.1287)
  line L7 (14.9379, -2.1287) -> (-27.6416, -2.1287)
  line L8 (14.9379, -2.1287) -> (-3.1099, -36.9655)
  line L9 (-9.5939, -36.9655) -> (-27.6416, -2.1287)
  arc A6 (-9.5939, -36.9655) -> (-3.1099, -36.9655) centre (-6.3519, -35.2859) ccw
  line L10 (12.6721, -4.7766) -> (-3.8147, -36.6004)
  arc A7 (-8.8891, -36.6004) -> (-3.8147, -36.6004) centre (-6.3519, -35.2859) ccw
  line L11 (-8.8891, -36.6004) -> (-25.3759, -4.7766)
  line L12 (11.5445, -2.9224) -> (-24.2482, -2.9224)
  arc A8 (12.6721, -4.7766) -> (11.5445, -2.9224) centre (11.5445, -4.1924) ccw
  arc A9 (-24.2482, -2.9224) -> (-25.3759, -4.7766) centre (-24.2482, -4.1924) ccw
  line L13 (11.8274, -2.9544) -> (12.2552, -2.1287)
  line L14 (-24.532, -2.9545) -> (-24.9598, -2.1287)
  dimension "d122" = 12.7
  dimension "d123" = 3.6513
  dimension "d125" = 1.27
extrude "Extrude19" add sketch "Sketch11" along normal blind 1.5875 contours L0 L2 L3 A4 L4 L7 L8 L9 A6 L10 A7 L11 A8 A9 L13 L14 bodies 1
extrude "Extrude20" add sketch "Sketch11" along normal blind 1.5875 separate body contours A0 L0 L2 L12 A8 A9 | A0 L0 L2 L10 A7 L11 A8 A9 makes body 3
move_body "Move5" bodies 3 to x (1, 0, 0) y (0, 1, 0) z (0, 0, 1) at (0, 0, 12.7)
fillet "Fillet8" radius 0.635 12 edges at (17.1325, 20.6885, 44.7802) (6.3519, 38.1434, 44.7802) (-4.4287, 20.6885, 44.7802) (-12.6295, 3.5325, 44.7802) (6.3519, 2.9224, 44.7802) (25.3333, 3.5325, 44.7802) (17.1325, 20.6885, 43.1927) (6.3519, 38.1434, 43.1927) (-4.4287, 20.6885, 43.1927) (-12.6295, 3.5325, 43.1927) (6.3519, 2.9224, 43.1927) (25.3333, 3.5325, 43.1927) on bodies 3
move_body "Move6" bodies 3 to x (1, 0, 0) y (0, 1, 0) z (0, 0, 1) at (0, 0, -12.7)
hole "Hole5" at (12.7, 0, -6.0198) direction (0, 0, 1) diameter 3.429 depth 10.16 tip angle 180 bodies 1
hole "Hole6" at (0, 0, -6.0198) direction (0, 0, 1) diameter 3.429 depth 10.16 tip angle 180 bodies 1
extrude "Extrude21" cut sketch "Sketch10" against normal blind 6.35 contours A1 L1 L5 L7 L8 L12 L13 L14 A7 | A1 L1 L8 L12 | L1 L8 L10 L11 A8 | L1 L5 L7 L8 L11 L14 bodies 1
equation "d58 = ( 7 / 8 ) * 1 in"
equation "d104 = ( -3 / 32 ) * 1 in"
equation "d105 = ( 1 / 16 ) * 1 in + ( 1 / 2 ) * 1 in"
equation "d107 = ( 1 / 16 ) * 1 in"
equation "d118 = ( 3 / 8 ) * 1 in"
equation "d126 = ( 1 / 16 ) * 1 in"
equation "d128 = ( 1 / 16 ) * 1 in"
equation "d142 = ( -1 / 4 ) * 1 in"
